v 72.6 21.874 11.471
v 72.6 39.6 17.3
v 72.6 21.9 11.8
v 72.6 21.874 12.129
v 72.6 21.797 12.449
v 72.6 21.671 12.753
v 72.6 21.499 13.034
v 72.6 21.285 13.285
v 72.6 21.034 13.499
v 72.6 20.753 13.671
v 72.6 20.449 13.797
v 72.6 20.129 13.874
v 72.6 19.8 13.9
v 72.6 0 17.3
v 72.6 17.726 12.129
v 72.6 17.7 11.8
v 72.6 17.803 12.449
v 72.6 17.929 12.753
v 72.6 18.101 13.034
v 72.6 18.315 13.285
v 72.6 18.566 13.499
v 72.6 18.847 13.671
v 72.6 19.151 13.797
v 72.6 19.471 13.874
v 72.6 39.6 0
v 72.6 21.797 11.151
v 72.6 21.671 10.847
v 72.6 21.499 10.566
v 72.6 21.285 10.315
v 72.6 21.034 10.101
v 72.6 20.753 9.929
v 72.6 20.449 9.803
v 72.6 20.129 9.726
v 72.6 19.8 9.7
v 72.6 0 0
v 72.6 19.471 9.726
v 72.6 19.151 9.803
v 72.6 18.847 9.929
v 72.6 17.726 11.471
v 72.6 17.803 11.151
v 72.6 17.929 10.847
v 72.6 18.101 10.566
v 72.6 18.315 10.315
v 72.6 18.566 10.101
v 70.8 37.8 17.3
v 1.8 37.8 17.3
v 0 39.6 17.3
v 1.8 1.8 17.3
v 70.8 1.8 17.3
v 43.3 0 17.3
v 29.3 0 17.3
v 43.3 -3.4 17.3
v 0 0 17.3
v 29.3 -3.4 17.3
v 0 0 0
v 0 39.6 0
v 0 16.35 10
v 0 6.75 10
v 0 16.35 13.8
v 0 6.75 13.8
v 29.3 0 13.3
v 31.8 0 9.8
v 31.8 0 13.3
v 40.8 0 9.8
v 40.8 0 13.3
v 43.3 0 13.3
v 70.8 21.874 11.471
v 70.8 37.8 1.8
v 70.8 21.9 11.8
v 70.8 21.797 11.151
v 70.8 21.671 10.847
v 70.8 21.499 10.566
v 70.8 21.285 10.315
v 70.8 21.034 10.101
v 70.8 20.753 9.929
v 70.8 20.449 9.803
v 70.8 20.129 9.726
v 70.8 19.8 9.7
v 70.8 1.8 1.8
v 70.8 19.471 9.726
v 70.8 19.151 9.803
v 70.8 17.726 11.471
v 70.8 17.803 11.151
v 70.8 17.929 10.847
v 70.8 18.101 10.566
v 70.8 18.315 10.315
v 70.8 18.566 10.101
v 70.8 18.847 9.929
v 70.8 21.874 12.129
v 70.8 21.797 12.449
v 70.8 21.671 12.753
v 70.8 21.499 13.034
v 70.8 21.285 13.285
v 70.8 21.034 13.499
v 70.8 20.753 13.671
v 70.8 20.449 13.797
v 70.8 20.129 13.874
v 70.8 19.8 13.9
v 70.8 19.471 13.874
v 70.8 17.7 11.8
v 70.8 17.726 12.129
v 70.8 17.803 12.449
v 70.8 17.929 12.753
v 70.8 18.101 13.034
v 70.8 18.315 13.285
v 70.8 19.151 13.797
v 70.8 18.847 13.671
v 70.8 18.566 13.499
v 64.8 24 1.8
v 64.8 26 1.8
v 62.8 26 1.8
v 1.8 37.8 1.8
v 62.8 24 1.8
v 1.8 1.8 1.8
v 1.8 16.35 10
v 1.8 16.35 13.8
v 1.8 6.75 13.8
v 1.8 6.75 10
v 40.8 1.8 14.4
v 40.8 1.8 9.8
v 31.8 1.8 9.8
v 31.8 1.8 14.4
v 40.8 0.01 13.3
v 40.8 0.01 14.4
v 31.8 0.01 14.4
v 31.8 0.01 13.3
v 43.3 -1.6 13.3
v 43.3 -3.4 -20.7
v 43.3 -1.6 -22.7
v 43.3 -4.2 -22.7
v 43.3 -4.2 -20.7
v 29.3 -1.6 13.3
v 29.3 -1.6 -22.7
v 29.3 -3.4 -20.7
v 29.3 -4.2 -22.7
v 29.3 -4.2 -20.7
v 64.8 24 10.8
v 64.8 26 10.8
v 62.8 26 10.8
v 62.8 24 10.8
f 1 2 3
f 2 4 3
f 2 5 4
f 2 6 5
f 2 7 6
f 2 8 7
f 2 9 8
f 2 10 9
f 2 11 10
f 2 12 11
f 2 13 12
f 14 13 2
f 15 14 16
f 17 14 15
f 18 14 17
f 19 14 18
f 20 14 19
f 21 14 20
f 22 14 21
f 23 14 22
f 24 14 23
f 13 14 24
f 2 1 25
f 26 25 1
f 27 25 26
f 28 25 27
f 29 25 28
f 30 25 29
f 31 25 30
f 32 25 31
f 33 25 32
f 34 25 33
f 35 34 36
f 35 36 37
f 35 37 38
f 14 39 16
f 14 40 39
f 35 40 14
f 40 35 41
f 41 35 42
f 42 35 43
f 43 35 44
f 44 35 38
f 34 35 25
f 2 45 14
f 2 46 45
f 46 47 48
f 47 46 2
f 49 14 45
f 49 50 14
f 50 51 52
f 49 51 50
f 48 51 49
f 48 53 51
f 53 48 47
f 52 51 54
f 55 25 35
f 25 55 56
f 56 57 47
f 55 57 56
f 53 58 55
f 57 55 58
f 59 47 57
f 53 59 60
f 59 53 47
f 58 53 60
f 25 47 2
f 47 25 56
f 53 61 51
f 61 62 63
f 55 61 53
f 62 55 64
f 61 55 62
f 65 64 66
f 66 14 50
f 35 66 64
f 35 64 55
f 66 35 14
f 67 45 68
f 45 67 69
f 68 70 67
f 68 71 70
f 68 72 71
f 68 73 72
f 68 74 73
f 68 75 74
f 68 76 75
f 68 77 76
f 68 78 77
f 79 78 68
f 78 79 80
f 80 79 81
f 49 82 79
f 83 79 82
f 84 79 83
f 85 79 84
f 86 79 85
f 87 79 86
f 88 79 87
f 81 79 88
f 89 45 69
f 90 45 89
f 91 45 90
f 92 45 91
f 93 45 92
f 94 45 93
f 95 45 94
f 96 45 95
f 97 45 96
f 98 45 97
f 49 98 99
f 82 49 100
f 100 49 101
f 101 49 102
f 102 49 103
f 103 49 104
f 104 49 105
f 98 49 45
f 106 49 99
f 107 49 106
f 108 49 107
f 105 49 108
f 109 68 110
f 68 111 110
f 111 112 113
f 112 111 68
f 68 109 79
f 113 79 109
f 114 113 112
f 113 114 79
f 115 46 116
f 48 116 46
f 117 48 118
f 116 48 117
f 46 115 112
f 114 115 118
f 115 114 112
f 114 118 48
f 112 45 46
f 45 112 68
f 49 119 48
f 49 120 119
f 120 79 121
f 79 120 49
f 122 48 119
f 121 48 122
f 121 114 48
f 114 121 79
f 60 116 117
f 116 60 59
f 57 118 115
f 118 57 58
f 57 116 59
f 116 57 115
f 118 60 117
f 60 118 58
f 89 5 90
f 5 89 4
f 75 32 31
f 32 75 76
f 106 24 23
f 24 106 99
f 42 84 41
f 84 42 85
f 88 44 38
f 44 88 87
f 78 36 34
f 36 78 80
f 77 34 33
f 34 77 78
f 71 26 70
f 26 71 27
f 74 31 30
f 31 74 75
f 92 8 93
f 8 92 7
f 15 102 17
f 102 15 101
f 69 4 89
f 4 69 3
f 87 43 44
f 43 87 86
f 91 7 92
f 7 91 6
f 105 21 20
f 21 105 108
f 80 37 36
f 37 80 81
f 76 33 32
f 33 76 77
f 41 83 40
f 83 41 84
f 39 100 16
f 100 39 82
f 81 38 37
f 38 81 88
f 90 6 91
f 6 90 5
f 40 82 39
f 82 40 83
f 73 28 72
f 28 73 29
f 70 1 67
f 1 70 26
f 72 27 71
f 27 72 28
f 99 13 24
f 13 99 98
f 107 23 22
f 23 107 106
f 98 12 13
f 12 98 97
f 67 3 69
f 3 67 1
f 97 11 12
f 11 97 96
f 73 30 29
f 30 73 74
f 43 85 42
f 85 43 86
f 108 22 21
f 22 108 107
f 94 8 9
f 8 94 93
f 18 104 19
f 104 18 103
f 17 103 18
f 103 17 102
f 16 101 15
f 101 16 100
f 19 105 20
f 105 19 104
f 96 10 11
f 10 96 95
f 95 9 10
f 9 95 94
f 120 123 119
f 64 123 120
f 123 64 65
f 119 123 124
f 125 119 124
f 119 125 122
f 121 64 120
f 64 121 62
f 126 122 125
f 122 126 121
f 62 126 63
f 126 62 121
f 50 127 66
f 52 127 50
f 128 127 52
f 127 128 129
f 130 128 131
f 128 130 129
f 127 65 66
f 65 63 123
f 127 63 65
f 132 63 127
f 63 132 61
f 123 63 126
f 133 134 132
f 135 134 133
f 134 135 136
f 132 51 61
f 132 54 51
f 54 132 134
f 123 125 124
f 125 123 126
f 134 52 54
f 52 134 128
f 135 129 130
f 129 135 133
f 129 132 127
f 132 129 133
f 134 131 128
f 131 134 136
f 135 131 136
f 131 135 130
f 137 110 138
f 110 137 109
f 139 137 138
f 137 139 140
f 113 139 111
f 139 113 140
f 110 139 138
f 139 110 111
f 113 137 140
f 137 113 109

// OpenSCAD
// OpenVision – pocket hub: battery + charger + 5 V boost + backup button, for the ESP32-CAM glasses
// -------------------------------------------------------------------------------------------------
// The glasses talk to the phone over Wi-Fi, so the hub only POWERS the camera (and carries a second
// button). One 4-core cable (an ordinary USB cable, cut) runs from the hub to the glasses:
//     red   = 5V   → ESP32-CAM 5V      black = GND → ESP32-CAM GND
//     green = BTN  → ESP32-CAM IO13    (hub button = same as the glasses button, wired in parallel)
//     white = unused
// Don't plug this glasses cable into a phone or PC: its D+ wire is now the button line.
//
// Electronics (pick one):
//   A) "power-bank" module with IP5306 (or similar): charge + protection + 5 V boost + USB-A out
//      + charge LEDs on ONE board. Simplest. Keeps running as long as the load is > ~50 mA (the
//      ESP32-CAM draws 150–300 mA, so it won't auto-switch off).
//   B) TP4056 Type-C charger WITH protection (DW01) + MT3608 boost set to 5.1 V, output soldered
//      to the cable. Uses both bays below.
// Battery: 1S LiPo pouch, 1000 mAh ≈ 3–5 h, 2000 mAh ≈ 6–10 h. Buy one with a protection board.
// Also: SS12D00 slide switch (in the battery + line), 6×6 or 12×12 tactile button, 470 µF cap
// across the 5 V output.
//
// Layout (inner, mm): battery flat on the floor; modules on top of it, charger at the -X end with
// its Type-C facing out, boost/output at the +X end. Measure YOUR parts and edit the numbers.
// Print: PETG, box open side up, lid flat (rim up). No supports.

/* [What to render] */
part = "preview";      // [preview, box, lid]

/* [Parts – measure yours] */
bat_l = 50;   bat_w = 34;   bat_t = 6;     // LiPo pouch (503450 = 1000 mAh; 604060 ≈ 2000 mAh)
chg_l = 28;   chg_w = 17.5; chg_t = 5;     // TP4056 Type-C board (or the power-bank module)
out_l = 37;   out_w = 17.5; out_t = 7;     // MT3608 board (option B) – set out_l = 0 for option A
usbc_w = 9.6; usbc_h = 3.8; usbc_z = 1.2;  // Type-C opening, z = above the module's PCB bottom
wall = 1.8;
gap  = 1.0;                                 // spare room around parts

/* [Openings] */
out_type = "cable";   // [cable, usb_a]   cable = gland hole for the glasses cable; usb_a = socket opening
cable_d  = 4.2;       // glasses cable diameter + 0.3
usba_w = 13.6; usba_h = 6.0;
sw_w = 9.0;  sw_h = 4.6;                    // slide-switch lever slot (SS12D00), on the long side
btn_d = 7.5;                                // hole in the lid for the button cap (12×12 switch: 7.5)
led_d = 2.2;  led_x = 8;                    // light hole above the charger LEDs (from the -X end)

/* [Pocket clip] */
clip = true;
clip_len = 40; clip_t = 1.8; clip_gap = 1.6; clip_w = 14;

$fn = 40;
eps = 0.01;

il = max(bat_l, chg_l + out_l + 2) + 2 * gap;     // inner length (X)
iw = max(bat_w, chg_w, out_w) + 2 * gap;           // inner width  (Y)
ih = bat_t + max(chg_t, out_t) + 1.5 + gap;       // inner height (Z): battery + modules + wires
L = il + 2 * wall; W = iw + 2 * wall; H = ih + wall;   // box (open top, lid adds 1.6)
mod_z = wall + bat_t + 1.0;                        // module PCBs sit on the battery on 1 mm foam tape
echo(str("Hub outside: ", L, " × ", W, " × ", H + 1.6, " mm"));

module box() {
  difference() {
    cube([L, W, H]);
    translate([wall, wall, wall]) cube([il, iw, ih + 1]);
    // Type-C charge port, -X end, centred on the charger
    translate([-1, wall + gap + chg_w / 2 - usbc_w / 2, mod_z + usbc_z]) cube([wall + 2, usbc_w, usbc_h]);
    // output, +X end
    if (out_type == "cable")
      translate([L - wall - 1, W / 2, mod_z + 3]) rotate([0, 90, 0]) cylinder(d = cable_d, h = wall + 2);
    else
      translate([L - wall - 1, W / 2 - usba_w / 2, mod_z + 1.5]) cube([wall + 2, usba_w, usba_h]);
    // slide switch, long side
    translate([L / 2 - sw_w / 2, -1, mod_z + 1]) cube([sw_w, wall + 2, sw_h]);
  }
  // cable strain relief: a bar inside the +X end to tie the cable to with a zip-tie
  if (out_type == "cable") translate([L - wall - 8, W / 2 + cable_d, wall]) cube([2, 2, mod_z - wall + 2]);
  // pocket clip on the -Y side: joined at the top, free at the bottom (slides over a pocket edge)
  if (clip) translate([L / 2 - clip_w / 2, 0, 0]) {
    translate([0, -clip_gap - clip_t, H - 4]) cube([clip_w, clip_gap + clip_t + eps, 4]);   // bridge
    translate([0, -clip_gap - clip_t, H - clip_len]) cube([clip_w, clip_t, clip_len]);        // tongue
    translate([0, -clip_gap - clip_t - 0.8, H - clip_len]) cube([clip_w, 0.8 + eps, 2]);       // grip bump
  }
}

module lid() {
  difference() {
    union() {
      cube([L, W, 1.6]);
      translate([wall + 0.15, wall + 0.15, 1.6]) difference() {         // locating rim (snap/friction fit)
        cube([il - 0.3, iw - 0.3, 2]);
        translate([1.2, 1.2, -eps]) cube([il - 2.7, iw - 2.7, 2 + 2 * eps]);
      }
    }
    translate([L / 2, W / 2, -1]) cylinder(d = btn_d, h = 5);           // button cap
    translate([wall + led_x, wall + gap + chg_w / 2, -1]) cylinder(d = led_d, h = 5);   // charge LEDs
  }
}

if (part == "box") box();
else if (part == "lid") lid();
else {
  box();
  %translate([0, W, H + 1.6]) rotate([180, 0, 0]) lid();
  // ghosts of the parts, to check the fit
  %translate([wall + gap, wall + gap, wall]) cube([bat_l, bat_w, bat_t]);
  %translate([wall + gap, wall + gap, mod_z]) cube([chg_l, chg_w, chg_t]);
  if (out_l > 0) %translate([L - wall - gap - out_l, wall + gap, mod_z]) cube([out_l, out_w, out_t]);
}
